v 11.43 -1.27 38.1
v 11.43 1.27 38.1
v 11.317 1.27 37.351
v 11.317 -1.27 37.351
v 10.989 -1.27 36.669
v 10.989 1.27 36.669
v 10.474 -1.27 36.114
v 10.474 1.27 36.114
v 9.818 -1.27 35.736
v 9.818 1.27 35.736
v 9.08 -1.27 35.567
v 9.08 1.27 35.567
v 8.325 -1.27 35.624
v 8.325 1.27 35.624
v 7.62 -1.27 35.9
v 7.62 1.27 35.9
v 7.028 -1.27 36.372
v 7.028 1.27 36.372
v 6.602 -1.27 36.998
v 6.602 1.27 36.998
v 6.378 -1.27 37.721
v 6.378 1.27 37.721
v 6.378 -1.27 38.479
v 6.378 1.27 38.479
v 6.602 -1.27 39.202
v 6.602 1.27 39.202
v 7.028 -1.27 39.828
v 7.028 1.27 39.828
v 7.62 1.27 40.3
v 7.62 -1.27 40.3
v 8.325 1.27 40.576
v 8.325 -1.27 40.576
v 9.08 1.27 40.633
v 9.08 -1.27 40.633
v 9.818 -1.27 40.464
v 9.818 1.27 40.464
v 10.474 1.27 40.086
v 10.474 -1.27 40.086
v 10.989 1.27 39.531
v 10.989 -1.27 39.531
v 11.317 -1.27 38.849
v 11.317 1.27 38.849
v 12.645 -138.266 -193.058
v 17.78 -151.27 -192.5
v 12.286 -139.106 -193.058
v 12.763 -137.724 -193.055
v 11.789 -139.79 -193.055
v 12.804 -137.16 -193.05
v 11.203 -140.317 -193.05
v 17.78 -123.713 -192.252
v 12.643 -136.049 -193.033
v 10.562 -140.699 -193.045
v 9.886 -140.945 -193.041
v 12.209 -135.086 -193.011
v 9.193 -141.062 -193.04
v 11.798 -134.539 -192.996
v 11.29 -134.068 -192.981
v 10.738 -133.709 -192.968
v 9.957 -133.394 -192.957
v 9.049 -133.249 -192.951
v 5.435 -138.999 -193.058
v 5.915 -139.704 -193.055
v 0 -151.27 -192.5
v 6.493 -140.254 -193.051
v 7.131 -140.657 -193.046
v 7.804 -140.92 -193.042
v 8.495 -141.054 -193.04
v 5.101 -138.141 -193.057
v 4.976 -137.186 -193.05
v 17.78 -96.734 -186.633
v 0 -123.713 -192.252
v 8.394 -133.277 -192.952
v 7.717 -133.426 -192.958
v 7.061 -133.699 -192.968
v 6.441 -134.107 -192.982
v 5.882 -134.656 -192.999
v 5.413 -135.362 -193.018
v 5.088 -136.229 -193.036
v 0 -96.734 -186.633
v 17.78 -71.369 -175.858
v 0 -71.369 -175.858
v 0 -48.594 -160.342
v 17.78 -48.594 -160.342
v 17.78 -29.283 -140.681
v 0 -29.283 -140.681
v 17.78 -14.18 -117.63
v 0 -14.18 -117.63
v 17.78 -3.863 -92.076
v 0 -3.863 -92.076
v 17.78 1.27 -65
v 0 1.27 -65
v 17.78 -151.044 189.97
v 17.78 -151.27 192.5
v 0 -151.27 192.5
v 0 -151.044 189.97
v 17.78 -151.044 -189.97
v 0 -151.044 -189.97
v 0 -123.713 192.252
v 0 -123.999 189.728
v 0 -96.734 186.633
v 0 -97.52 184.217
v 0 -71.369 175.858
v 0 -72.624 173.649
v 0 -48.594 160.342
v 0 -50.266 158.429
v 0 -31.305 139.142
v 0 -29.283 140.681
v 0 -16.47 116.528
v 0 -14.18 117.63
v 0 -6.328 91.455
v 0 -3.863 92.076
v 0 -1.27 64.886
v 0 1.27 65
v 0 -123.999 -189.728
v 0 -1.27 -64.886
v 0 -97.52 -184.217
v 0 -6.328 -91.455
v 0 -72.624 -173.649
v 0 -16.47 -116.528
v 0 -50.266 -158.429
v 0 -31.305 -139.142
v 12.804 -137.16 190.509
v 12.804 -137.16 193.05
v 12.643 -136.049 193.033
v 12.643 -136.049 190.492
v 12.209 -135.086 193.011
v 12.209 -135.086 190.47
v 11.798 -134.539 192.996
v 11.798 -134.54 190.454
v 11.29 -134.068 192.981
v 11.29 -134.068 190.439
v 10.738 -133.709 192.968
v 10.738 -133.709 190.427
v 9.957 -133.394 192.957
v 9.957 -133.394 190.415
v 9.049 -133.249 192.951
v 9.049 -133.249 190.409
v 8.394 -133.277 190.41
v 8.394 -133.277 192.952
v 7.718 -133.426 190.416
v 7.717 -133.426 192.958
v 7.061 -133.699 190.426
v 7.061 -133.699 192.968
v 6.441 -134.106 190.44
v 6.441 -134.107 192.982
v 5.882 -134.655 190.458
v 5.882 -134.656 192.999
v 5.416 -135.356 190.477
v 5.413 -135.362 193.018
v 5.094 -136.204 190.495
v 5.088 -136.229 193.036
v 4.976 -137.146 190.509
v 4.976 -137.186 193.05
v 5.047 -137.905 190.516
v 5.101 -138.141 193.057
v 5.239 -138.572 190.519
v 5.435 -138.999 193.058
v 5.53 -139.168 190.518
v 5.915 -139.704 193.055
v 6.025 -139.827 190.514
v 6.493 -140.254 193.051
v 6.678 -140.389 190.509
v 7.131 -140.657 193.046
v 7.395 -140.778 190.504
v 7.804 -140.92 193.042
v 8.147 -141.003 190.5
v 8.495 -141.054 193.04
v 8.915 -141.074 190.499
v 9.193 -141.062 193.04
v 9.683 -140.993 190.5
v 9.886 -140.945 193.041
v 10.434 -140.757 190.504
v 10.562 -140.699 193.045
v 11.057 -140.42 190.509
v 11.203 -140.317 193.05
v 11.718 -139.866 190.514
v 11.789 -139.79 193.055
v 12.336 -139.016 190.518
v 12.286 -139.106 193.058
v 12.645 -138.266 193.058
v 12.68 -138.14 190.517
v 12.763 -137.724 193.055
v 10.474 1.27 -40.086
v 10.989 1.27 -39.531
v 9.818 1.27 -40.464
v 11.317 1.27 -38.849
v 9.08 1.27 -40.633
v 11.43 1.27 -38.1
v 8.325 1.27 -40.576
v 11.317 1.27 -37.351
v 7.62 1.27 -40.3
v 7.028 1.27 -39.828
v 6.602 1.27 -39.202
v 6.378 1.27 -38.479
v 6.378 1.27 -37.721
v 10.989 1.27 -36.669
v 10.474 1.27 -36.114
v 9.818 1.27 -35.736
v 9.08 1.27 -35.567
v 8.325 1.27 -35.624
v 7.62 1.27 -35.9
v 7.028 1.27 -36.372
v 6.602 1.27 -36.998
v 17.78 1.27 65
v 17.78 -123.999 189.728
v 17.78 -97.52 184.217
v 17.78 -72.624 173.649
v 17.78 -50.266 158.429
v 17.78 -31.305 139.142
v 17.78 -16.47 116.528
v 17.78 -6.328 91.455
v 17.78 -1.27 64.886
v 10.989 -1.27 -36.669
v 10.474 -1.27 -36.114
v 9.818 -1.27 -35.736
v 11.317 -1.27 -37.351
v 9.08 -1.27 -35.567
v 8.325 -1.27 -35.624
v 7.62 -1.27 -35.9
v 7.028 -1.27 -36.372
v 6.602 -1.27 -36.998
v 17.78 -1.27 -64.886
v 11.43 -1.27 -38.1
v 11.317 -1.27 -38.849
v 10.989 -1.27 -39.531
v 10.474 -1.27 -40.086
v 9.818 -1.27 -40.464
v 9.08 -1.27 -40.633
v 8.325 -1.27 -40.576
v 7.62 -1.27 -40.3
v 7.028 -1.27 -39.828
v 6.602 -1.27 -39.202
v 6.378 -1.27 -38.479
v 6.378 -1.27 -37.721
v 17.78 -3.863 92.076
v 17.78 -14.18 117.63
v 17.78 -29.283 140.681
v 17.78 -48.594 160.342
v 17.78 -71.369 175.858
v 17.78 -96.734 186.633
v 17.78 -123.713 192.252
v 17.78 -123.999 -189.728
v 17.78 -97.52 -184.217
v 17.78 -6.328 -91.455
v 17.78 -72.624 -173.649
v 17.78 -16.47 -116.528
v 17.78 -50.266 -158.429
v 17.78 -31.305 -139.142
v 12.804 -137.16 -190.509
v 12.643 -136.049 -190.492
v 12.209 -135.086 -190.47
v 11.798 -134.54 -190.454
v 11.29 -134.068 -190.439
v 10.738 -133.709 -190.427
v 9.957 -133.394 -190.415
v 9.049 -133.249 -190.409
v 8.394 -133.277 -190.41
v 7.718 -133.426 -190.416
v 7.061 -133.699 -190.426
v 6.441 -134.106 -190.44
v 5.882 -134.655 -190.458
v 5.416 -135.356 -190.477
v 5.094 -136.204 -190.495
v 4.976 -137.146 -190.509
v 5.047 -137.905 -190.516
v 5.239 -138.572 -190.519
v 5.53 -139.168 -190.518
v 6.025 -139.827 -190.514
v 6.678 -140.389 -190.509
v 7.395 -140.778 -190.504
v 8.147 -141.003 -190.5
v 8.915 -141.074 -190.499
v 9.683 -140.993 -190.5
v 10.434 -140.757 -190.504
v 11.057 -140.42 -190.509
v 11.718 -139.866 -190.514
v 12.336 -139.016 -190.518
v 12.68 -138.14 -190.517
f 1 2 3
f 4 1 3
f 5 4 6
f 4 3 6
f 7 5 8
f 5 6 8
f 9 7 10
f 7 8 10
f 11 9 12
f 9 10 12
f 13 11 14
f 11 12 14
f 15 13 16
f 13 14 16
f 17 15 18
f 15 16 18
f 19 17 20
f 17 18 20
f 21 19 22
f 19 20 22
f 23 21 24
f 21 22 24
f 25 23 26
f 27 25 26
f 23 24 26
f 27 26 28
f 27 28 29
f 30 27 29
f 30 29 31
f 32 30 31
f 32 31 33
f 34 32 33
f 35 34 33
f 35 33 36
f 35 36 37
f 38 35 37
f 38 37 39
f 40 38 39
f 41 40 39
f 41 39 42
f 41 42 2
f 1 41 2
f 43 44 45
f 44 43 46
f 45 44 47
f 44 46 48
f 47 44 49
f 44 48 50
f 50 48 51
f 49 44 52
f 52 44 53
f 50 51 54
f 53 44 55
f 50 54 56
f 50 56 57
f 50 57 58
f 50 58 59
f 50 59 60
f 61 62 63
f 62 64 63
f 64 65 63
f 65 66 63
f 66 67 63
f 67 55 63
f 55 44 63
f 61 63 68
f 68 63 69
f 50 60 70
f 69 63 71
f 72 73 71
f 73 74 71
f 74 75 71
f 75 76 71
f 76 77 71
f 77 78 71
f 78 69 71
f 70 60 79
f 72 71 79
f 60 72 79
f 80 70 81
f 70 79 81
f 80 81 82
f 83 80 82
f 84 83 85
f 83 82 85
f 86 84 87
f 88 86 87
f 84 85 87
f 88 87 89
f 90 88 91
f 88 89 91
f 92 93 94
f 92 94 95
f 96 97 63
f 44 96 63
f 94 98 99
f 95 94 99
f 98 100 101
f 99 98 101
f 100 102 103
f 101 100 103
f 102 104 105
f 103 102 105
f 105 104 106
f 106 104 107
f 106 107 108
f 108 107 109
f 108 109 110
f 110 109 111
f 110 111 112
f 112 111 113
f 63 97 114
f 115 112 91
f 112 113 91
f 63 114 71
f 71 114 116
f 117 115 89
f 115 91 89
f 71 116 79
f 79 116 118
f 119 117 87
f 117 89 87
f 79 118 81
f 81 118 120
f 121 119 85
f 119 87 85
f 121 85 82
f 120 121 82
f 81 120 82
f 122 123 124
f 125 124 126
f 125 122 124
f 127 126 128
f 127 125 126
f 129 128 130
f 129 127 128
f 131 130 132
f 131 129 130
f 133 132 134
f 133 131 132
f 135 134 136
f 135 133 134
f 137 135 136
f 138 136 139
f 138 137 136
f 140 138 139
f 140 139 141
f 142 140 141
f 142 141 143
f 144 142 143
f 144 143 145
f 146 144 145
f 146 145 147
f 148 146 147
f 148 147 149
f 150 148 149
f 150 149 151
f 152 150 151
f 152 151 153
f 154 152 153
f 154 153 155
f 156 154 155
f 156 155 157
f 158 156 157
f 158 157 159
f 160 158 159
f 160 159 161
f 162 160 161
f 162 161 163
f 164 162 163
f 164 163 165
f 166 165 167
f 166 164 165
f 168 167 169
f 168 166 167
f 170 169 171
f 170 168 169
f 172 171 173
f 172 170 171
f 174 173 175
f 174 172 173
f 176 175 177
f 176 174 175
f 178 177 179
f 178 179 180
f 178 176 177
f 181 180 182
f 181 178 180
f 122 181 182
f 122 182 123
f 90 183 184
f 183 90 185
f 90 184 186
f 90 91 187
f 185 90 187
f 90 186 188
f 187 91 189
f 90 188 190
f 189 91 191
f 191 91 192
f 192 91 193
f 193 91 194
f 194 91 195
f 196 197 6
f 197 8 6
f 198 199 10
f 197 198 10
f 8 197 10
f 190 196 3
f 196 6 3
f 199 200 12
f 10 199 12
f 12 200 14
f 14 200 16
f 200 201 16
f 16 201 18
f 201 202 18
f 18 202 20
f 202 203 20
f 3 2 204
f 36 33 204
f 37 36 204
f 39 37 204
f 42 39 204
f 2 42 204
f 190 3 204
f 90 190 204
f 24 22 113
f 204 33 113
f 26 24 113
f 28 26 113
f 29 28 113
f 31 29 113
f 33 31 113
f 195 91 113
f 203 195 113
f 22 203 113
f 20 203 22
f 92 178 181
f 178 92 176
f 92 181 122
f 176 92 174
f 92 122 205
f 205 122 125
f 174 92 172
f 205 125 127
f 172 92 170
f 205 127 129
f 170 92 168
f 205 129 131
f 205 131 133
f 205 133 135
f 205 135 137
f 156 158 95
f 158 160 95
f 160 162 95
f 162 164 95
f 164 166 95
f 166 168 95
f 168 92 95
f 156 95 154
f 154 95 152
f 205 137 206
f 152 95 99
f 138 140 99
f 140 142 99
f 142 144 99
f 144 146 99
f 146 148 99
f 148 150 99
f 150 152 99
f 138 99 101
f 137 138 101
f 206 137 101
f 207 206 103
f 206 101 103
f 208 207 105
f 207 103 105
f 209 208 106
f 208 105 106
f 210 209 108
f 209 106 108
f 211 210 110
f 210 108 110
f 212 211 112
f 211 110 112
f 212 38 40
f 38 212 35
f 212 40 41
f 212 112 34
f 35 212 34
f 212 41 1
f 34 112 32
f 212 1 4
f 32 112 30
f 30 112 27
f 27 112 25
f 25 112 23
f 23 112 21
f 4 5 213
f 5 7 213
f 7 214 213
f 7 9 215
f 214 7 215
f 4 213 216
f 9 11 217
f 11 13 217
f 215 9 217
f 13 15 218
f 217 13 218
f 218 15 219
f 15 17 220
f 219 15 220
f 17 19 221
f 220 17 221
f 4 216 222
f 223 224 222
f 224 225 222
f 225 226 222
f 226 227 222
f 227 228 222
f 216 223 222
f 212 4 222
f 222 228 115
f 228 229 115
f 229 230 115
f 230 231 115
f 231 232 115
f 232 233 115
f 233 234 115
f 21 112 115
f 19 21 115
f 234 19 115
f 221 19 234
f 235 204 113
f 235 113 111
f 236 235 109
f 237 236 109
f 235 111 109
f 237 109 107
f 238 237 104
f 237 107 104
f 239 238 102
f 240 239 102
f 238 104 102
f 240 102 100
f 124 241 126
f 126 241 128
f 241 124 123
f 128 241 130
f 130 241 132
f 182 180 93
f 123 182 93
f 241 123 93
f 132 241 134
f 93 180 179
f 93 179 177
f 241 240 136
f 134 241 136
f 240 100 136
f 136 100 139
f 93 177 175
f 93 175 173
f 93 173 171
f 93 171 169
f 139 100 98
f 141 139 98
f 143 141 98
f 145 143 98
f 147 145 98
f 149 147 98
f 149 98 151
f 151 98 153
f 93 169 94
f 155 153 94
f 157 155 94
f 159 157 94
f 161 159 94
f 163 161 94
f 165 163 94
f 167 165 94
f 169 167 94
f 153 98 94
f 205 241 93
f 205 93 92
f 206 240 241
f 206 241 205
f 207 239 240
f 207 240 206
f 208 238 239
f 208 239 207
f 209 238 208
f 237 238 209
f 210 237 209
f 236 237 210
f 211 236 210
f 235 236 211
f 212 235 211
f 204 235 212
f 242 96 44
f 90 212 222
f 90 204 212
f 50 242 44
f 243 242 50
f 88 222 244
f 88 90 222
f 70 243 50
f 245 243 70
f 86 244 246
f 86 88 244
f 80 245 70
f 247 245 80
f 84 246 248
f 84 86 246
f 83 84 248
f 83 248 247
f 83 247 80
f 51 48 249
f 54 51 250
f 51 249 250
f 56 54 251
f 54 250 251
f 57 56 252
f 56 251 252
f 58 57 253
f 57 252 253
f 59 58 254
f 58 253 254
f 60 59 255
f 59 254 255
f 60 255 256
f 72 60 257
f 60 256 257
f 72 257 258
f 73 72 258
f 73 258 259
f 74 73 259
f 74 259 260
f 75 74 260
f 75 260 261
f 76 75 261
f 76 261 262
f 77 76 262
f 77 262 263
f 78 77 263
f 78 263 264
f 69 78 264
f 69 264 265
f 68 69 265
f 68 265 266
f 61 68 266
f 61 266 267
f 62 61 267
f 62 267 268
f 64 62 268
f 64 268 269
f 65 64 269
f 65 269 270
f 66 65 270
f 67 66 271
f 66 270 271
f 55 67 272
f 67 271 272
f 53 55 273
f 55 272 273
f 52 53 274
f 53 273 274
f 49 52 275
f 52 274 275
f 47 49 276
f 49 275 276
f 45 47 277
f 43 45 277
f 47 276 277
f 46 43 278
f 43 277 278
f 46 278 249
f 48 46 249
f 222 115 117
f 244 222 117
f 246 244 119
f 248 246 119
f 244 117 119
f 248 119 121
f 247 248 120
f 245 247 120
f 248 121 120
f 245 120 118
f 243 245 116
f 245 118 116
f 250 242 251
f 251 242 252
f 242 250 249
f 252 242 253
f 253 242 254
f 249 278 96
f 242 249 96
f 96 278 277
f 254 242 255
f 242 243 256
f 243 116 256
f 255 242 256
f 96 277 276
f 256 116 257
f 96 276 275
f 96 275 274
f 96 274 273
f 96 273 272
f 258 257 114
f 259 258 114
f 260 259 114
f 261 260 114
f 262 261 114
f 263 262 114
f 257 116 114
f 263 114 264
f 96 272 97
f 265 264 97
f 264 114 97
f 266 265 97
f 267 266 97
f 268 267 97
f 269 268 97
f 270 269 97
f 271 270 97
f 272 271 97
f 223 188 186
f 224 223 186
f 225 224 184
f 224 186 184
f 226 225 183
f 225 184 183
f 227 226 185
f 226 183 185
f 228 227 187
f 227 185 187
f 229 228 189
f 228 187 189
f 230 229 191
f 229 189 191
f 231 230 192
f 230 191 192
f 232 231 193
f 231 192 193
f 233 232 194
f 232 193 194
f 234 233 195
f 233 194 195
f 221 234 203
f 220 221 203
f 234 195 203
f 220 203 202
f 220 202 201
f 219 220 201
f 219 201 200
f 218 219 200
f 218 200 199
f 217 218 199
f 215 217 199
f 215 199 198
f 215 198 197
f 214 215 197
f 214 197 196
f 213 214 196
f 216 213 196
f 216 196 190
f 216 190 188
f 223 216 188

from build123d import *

# Parameters (mm, degrees)
BOSS_EXTRUDE1_DEPTH     = 17.78
SKETCH2_R               = 3.914165929
CUT_EXTRUDE1_DEPTH      = 194.058628532
CUT_EXTRUDE1_DEPTH_BACK = 194.058628532
SKETCH3_R               = 2.54
CUT_EXTRUDE2_DEPTH      = 7.62


with BuildPart() as part:
    # Sketch1 → Boss-Extrude1 (new body)
    with BuildSketch(Plane(origin=(0, 0, 0), x_dir=(0, 0, -1), z_dir=(1, 0, 0))):
        with BuildLine():
            Line((65, 1.27), (-65, 1.27))
            ThreePointArc((-65, 1.27), (-160.342068402, -48.593885399), (-192.5, -151.27))
            Line((-192.5, -151.27), (-189.970093401, -151.043786383))
            ThreePointArc((-189.970093401, -151.043786383), (-158.429364067, -50.266130166), (-64.886150372, -1.27))
            Line((-64.886150372, -1.27), (64.886150372, -1.27))
            ThreePointArc((64.886150372, -1.27), (158.429364067, -50.266130166), (189.970093401, -151.043786383))
            Line((189.970093401, -151.043786383), (192.5, -151.27))
            ThreePointArc((192.5, -151.27), (160.342068402, -48.593885399), (65, 1.27))
        make_face()
    extrude(amount=BOSS_EXTRUDE1_DEPTH)

    # Sketch2 → Cut-Extrude1 (cut, two sides)
    with BuildSketch(Plane.XY) as cut_extrude1_sk:
        with Locations((8.89, -137.16)):
            Circle(SKETCH2_R)
    extrude(amount=CUT_EXTRUDE1_DEPTH, mode=Mode.SUBTRACT)
    extrude(cut_extrude1_sk.sketch, amount=-CUT_EXTRUDE1_DEPTH_BACK, mode=Mode.SUBTRACT)

    # Sketch3 → Cut-Extrude2 (cut)
    with BuildSketch(Plane(origin=(0, 1.27, 0), x_dir=(1, 0, 0), z_dir=(0, 1, 0))):
        with Locations((8.89, 38.1)):
            Circle(SKETCH3_R)
        with Locations((8.89, -38.1)):
            Circle(SKETCH3_R)
    extrude(amount=-CUT_EXTRUDE2_DEPTH, mode=Mode.SUBTRACT)


solid = part.part
